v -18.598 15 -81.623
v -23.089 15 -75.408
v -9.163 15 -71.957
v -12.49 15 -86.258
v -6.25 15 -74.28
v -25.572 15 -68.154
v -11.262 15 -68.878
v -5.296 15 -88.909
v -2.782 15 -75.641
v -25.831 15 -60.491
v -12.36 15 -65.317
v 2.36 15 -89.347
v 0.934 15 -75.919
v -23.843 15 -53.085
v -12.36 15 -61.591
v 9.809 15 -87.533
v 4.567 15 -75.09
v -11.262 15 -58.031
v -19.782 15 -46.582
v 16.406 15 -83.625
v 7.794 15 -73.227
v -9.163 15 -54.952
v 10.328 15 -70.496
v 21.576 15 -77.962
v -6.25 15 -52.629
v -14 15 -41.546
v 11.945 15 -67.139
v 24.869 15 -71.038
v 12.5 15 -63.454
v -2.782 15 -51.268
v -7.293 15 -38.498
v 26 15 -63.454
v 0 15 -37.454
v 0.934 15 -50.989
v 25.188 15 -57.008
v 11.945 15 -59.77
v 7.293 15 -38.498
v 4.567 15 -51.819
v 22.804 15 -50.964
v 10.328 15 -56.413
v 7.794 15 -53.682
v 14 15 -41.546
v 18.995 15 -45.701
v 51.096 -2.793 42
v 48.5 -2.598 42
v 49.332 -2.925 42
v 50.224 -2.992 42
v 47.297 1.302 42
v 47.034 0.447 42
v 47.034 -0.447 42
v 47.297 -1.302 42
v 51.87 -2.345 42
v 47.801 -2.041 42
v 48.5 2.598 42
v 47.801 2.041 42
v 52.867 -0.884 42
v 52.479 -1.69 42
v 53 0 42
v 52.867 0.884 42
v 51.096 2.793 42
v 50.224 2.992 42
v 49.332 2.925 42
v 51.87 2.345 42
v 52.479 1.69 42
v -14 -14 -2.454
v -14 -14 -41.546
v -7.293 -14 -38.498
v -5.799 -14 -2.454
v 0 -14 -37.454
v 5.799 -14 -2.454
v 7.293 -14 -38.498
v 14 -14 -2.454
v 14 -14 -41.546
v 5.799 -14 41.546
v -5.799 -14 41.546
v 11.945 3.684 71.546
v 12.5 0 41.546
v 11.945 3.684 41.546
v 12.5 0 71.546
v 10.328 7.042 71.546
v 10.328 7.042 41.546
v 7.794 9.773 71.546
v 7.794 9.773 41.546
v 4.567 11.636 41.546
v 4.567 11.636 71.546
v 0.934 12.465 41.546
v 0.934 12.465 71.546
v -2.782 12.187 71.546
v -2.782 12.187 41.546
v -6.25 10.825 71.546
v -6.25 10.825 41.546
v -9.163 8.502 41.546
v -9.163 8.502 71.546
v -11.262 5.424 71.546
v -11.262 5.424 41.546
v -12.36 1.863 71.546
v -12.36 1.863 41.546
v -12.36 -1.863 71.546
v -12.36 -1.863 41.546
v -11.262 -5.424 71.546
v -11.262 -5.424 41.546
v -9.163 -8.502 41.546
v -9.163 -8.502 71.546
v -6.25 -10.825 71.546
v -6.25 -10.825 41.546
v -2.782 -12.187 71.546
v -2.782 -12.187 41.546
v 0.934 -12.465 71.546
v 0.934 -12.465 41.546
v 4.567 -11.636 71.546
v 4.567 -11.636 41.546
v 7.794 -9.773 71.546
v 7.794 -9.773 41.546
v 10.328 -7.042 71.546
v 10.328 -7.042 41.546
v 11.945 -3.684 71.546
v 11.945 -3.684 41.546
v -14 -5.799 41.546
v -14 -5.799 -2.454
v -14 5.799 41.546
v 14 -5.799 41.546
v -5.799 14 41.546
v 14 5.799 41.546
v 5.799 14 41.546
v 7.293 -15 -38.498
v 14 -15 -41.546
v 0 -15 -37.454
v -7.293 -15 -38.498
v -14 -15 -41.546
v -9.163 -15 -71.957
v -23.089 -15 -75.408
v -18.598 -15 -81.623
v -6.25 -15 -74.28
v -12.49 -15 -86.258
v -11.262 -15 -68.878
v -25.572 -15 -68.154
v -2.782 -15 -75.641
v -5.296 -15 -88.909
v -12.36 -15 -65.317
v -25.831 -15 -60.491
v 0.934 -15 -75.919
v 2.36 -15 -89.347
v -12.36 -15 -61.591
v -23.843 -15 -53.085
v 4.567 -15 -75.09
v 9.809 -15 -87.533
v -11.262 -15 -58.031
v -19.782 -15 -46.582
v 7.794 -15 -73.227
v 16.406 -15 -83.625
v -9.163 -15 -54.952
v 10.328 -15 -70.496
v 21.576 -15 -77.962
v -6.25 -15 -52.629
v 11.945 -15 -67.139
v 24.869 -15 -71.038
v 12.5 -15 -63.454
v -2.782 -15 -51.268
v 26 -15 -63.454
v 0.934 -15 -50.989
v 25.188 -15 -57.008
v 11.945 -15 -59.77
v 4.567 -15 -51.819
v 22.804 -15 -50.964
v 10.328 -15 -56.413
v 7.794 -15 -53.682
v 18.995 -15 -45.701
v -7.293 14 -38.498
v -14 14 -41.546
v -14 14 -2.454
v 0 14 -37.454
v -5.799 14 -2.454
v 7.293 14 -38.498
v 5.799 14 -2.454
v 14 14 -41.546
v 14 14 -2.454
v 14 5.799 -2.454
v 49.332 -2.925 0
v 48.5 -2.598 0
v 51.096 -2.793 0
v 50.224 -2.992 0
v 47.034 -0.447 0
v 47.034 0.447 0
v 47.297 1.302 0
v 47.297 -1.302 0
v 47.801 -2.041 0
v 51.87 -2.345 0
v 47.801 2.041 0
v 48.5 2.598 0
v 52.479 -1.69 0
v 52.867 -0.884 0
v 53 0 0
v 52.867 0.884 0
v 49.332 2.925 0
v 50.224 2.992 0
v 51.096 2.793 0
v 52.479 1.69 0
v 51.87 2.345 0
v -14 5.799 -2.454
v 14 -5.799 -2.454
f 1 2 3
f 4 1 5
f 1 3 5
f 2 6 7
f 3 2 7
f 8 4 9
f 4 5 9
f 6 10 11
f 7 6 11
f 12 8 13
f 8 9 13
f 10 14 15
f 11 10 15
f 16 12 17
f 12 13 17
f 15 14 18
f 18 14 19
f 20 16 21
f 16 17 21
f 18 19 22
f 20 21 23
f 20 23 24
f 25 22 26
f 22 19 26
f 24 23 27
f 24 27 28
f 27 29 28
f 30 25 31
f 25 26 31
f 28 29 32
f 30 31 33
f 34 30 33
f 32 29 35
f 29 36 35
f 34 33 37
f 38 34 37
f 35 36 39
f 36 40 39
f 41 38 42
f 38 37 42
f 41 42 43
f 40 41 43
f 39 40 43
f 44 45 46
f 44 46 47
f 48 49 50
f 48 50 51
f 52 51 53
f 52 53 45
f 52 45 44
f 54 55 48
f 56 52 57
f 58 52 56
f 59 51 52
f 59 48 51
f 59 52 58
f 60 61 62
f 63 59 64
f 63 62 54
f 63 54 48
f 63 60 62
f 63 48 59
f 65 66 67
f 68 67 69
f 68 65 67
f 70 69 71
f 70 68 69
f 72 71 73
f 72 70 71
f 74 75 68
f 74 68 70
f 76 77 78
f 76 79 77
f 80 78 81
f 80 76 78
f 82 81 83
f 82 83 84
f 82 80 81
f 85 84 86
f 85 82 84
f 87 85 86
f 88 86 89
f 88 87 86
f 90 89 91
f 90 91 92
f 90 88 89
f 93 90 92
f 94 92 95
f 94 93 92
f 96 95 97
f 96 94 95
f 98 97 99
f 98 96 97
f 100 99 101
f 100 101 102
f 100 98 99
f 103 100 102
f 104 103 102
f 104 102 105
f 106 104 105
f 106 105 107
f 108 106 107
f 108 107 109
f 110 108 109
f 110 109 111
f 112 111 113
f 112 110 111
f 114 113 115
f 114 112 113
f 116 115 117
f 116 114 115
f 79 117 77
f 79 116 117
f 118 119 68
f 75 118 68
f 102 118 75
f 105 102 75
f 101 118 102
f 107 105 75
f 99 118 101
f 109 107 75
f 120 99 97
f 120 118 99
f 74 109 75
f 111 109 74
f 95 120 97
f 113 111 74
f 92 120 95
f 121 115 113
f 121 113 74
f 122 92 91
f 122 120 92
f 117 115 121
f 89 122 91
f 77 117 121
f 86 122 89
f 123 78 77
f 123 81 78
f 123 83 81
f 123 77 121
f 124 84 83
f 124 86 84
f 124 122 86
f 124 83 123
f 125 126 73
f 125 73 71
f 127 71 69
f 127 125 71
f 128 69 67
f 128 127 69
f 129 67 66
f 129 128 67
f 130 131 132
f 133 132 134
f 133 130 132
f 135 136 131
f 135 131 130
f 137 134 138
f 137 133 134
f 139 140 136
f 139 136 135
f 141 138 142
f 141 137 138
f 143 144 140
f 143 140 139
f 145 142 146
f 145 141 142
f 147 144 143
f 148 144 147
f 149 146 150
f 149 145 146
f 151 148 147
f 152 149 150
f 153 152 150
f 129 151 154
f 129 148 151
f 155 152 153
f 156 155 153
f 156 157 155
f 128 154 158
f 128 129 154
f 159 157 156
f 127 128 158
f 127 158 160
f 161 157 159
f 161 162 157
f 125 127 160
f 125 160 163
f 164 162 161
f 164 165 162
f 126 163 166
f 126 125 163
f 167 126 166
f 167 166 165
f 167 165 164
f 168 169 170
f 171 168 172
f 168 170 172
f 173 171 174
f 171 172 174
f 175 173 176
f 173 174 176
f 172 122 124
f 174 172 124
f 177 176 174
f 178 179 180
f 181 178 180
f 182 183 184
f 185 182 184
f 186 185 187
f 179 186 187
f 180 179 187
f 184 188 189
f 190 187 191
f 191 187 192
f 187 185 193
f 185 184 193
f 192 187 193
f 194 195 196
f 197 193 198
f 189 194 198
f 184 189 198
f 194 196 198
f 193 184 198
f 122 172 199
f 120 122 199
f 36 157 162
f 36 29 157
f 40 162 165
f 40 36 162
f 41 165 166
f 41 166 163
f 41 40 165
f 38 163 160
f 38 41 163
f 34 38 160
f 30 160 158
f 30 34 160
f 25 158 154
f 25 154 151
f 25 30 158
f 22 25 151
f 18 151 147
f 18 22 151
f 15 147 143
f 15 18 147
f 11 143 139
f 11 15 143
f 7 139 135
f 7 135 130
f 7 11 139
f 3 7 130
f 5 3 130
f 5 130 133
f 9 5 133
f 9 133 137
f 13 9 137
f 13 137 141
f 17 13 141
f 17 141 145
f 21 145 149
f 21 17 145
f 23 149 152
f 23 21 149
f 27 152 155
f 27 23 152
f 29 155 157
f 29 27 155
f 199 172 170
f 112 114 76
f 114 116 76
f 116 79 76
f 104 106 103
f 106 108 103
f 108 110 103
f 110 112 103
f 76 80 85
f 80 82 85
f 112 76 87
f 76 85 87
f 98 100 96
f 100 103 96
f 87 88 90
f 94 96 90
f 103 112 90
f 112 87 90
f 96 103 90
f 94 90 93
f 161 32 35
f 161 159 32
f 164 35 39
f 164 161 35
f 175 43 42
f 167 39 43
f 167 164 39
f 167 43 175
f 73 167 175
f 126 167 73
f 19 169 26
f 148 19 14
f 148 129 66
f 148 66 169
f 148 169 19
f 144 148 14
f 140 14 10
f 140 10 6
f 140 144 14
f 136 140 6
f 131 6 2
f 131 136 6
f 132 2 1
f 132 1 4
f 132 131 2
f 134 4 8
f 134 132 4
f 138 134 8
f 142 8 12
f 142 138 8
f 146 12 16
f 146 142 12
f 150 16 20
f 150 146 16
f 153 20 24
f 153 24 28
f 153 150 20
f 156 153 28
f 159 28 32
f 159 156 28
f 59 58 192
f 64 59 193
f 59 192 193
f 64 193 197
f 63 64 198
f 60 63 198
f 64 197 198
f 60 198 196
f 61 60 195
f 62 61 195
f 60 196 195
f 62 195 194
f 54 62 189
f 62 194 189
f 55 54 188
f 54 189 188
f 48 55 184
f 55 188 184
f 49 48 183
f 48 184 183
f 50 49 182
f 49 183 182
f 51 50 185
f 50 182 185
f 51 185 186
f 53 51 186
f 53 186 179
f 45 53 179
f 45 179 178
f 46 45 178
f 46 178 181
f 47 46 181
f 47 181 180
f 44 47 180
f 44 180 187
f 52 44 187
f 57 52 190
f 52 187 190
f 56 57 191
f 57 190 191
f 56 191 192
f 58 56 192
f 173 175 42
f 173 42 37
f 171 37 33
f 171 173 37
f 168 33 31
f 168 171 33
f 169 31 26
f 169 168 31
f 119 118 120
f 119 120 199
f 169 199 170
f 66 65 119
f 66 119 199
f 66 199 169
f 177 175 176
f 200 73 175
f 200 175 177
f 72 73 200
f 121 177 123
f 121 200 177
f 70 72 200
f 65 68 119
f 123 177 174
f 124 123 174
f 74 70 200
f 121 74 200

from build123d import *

# Parameters (mm, degrees)
F0_R     = 12.5
F1_DEPTH = 15
F2_DEPTH = 14
F4_DEPTH = 44
F0_W     = 12.5
F0_H     = 30
F6_R     = 3
F7_DEPTH = 42


with BuildPart() as f1:
    # F0 (on Front) → F1 (new body, symmetric)
    with BuildSketch(Plane.XZ):
        with BuildLine():
            ThreePointArc((26, -63.454451), (22.803509, -50.964455), (14, -41.545549))
            ThreePointArc((14, -41.545549), (0, -37.454451), (-14, -41.545549))
            ThreePointArc((-14, -41.545549), (-12.489996, -86.25796), (26, -63.454451))
        make_face()
        with Locations((0, -63.454451)):
            Circle(F0_R, mode=Mode.SUBTRACT)
    extrude(amount=F1_DEPTH, both=True)

    # F0 (on Front) → F2 (join, symmetric)
    with BuildSketch(Plane.XZ):
        with BuildLine():
            Line((14, -41.545549), (14, -2.454451))
            Line((14, -2.454451), (-14, -2.454451))
            Line((-14, -2.454451), (-14, -41.545549))
            ThreePointArc((-14, -41.545549), (0, -37.454451), (14, -41.545549))
        make_face()
    extrude(amount=F2_DEPTH, both=True)

    # F3 (on face) → F4 (join)
    with BuildSketch(Plane.XY.offset(-2.454451)):
        Polygon((14, 5.79899), (5.79899, 14), (-5.79899, 14), (-14, 5.79899), (-14, -5.79899), (-5.79899, -14), (5.79899, -14), (14, -5.79899), align=None)
    extrude(amount=F4_DEPTH)

    # F0 (on Front) → F5 (revolve)
    with BuildSketch(Plane.XZ):
        with Locations((6.25, 56.545549)):
            Rectangle(F0_W, F0_H)
    revolve(axis=Axis((0, 0, 56.545549), (0, 0, 1)))


with BuildPart() as f7:
    # F6 (on Top) → F7 (new body)
    with BuildSketch(Plane.XY):
        with Locations((50, 0)):
            Circle(F6_R)
    extrude(amount=F7_DEPTH)


solid = Compound([f1.part, f7.part])
